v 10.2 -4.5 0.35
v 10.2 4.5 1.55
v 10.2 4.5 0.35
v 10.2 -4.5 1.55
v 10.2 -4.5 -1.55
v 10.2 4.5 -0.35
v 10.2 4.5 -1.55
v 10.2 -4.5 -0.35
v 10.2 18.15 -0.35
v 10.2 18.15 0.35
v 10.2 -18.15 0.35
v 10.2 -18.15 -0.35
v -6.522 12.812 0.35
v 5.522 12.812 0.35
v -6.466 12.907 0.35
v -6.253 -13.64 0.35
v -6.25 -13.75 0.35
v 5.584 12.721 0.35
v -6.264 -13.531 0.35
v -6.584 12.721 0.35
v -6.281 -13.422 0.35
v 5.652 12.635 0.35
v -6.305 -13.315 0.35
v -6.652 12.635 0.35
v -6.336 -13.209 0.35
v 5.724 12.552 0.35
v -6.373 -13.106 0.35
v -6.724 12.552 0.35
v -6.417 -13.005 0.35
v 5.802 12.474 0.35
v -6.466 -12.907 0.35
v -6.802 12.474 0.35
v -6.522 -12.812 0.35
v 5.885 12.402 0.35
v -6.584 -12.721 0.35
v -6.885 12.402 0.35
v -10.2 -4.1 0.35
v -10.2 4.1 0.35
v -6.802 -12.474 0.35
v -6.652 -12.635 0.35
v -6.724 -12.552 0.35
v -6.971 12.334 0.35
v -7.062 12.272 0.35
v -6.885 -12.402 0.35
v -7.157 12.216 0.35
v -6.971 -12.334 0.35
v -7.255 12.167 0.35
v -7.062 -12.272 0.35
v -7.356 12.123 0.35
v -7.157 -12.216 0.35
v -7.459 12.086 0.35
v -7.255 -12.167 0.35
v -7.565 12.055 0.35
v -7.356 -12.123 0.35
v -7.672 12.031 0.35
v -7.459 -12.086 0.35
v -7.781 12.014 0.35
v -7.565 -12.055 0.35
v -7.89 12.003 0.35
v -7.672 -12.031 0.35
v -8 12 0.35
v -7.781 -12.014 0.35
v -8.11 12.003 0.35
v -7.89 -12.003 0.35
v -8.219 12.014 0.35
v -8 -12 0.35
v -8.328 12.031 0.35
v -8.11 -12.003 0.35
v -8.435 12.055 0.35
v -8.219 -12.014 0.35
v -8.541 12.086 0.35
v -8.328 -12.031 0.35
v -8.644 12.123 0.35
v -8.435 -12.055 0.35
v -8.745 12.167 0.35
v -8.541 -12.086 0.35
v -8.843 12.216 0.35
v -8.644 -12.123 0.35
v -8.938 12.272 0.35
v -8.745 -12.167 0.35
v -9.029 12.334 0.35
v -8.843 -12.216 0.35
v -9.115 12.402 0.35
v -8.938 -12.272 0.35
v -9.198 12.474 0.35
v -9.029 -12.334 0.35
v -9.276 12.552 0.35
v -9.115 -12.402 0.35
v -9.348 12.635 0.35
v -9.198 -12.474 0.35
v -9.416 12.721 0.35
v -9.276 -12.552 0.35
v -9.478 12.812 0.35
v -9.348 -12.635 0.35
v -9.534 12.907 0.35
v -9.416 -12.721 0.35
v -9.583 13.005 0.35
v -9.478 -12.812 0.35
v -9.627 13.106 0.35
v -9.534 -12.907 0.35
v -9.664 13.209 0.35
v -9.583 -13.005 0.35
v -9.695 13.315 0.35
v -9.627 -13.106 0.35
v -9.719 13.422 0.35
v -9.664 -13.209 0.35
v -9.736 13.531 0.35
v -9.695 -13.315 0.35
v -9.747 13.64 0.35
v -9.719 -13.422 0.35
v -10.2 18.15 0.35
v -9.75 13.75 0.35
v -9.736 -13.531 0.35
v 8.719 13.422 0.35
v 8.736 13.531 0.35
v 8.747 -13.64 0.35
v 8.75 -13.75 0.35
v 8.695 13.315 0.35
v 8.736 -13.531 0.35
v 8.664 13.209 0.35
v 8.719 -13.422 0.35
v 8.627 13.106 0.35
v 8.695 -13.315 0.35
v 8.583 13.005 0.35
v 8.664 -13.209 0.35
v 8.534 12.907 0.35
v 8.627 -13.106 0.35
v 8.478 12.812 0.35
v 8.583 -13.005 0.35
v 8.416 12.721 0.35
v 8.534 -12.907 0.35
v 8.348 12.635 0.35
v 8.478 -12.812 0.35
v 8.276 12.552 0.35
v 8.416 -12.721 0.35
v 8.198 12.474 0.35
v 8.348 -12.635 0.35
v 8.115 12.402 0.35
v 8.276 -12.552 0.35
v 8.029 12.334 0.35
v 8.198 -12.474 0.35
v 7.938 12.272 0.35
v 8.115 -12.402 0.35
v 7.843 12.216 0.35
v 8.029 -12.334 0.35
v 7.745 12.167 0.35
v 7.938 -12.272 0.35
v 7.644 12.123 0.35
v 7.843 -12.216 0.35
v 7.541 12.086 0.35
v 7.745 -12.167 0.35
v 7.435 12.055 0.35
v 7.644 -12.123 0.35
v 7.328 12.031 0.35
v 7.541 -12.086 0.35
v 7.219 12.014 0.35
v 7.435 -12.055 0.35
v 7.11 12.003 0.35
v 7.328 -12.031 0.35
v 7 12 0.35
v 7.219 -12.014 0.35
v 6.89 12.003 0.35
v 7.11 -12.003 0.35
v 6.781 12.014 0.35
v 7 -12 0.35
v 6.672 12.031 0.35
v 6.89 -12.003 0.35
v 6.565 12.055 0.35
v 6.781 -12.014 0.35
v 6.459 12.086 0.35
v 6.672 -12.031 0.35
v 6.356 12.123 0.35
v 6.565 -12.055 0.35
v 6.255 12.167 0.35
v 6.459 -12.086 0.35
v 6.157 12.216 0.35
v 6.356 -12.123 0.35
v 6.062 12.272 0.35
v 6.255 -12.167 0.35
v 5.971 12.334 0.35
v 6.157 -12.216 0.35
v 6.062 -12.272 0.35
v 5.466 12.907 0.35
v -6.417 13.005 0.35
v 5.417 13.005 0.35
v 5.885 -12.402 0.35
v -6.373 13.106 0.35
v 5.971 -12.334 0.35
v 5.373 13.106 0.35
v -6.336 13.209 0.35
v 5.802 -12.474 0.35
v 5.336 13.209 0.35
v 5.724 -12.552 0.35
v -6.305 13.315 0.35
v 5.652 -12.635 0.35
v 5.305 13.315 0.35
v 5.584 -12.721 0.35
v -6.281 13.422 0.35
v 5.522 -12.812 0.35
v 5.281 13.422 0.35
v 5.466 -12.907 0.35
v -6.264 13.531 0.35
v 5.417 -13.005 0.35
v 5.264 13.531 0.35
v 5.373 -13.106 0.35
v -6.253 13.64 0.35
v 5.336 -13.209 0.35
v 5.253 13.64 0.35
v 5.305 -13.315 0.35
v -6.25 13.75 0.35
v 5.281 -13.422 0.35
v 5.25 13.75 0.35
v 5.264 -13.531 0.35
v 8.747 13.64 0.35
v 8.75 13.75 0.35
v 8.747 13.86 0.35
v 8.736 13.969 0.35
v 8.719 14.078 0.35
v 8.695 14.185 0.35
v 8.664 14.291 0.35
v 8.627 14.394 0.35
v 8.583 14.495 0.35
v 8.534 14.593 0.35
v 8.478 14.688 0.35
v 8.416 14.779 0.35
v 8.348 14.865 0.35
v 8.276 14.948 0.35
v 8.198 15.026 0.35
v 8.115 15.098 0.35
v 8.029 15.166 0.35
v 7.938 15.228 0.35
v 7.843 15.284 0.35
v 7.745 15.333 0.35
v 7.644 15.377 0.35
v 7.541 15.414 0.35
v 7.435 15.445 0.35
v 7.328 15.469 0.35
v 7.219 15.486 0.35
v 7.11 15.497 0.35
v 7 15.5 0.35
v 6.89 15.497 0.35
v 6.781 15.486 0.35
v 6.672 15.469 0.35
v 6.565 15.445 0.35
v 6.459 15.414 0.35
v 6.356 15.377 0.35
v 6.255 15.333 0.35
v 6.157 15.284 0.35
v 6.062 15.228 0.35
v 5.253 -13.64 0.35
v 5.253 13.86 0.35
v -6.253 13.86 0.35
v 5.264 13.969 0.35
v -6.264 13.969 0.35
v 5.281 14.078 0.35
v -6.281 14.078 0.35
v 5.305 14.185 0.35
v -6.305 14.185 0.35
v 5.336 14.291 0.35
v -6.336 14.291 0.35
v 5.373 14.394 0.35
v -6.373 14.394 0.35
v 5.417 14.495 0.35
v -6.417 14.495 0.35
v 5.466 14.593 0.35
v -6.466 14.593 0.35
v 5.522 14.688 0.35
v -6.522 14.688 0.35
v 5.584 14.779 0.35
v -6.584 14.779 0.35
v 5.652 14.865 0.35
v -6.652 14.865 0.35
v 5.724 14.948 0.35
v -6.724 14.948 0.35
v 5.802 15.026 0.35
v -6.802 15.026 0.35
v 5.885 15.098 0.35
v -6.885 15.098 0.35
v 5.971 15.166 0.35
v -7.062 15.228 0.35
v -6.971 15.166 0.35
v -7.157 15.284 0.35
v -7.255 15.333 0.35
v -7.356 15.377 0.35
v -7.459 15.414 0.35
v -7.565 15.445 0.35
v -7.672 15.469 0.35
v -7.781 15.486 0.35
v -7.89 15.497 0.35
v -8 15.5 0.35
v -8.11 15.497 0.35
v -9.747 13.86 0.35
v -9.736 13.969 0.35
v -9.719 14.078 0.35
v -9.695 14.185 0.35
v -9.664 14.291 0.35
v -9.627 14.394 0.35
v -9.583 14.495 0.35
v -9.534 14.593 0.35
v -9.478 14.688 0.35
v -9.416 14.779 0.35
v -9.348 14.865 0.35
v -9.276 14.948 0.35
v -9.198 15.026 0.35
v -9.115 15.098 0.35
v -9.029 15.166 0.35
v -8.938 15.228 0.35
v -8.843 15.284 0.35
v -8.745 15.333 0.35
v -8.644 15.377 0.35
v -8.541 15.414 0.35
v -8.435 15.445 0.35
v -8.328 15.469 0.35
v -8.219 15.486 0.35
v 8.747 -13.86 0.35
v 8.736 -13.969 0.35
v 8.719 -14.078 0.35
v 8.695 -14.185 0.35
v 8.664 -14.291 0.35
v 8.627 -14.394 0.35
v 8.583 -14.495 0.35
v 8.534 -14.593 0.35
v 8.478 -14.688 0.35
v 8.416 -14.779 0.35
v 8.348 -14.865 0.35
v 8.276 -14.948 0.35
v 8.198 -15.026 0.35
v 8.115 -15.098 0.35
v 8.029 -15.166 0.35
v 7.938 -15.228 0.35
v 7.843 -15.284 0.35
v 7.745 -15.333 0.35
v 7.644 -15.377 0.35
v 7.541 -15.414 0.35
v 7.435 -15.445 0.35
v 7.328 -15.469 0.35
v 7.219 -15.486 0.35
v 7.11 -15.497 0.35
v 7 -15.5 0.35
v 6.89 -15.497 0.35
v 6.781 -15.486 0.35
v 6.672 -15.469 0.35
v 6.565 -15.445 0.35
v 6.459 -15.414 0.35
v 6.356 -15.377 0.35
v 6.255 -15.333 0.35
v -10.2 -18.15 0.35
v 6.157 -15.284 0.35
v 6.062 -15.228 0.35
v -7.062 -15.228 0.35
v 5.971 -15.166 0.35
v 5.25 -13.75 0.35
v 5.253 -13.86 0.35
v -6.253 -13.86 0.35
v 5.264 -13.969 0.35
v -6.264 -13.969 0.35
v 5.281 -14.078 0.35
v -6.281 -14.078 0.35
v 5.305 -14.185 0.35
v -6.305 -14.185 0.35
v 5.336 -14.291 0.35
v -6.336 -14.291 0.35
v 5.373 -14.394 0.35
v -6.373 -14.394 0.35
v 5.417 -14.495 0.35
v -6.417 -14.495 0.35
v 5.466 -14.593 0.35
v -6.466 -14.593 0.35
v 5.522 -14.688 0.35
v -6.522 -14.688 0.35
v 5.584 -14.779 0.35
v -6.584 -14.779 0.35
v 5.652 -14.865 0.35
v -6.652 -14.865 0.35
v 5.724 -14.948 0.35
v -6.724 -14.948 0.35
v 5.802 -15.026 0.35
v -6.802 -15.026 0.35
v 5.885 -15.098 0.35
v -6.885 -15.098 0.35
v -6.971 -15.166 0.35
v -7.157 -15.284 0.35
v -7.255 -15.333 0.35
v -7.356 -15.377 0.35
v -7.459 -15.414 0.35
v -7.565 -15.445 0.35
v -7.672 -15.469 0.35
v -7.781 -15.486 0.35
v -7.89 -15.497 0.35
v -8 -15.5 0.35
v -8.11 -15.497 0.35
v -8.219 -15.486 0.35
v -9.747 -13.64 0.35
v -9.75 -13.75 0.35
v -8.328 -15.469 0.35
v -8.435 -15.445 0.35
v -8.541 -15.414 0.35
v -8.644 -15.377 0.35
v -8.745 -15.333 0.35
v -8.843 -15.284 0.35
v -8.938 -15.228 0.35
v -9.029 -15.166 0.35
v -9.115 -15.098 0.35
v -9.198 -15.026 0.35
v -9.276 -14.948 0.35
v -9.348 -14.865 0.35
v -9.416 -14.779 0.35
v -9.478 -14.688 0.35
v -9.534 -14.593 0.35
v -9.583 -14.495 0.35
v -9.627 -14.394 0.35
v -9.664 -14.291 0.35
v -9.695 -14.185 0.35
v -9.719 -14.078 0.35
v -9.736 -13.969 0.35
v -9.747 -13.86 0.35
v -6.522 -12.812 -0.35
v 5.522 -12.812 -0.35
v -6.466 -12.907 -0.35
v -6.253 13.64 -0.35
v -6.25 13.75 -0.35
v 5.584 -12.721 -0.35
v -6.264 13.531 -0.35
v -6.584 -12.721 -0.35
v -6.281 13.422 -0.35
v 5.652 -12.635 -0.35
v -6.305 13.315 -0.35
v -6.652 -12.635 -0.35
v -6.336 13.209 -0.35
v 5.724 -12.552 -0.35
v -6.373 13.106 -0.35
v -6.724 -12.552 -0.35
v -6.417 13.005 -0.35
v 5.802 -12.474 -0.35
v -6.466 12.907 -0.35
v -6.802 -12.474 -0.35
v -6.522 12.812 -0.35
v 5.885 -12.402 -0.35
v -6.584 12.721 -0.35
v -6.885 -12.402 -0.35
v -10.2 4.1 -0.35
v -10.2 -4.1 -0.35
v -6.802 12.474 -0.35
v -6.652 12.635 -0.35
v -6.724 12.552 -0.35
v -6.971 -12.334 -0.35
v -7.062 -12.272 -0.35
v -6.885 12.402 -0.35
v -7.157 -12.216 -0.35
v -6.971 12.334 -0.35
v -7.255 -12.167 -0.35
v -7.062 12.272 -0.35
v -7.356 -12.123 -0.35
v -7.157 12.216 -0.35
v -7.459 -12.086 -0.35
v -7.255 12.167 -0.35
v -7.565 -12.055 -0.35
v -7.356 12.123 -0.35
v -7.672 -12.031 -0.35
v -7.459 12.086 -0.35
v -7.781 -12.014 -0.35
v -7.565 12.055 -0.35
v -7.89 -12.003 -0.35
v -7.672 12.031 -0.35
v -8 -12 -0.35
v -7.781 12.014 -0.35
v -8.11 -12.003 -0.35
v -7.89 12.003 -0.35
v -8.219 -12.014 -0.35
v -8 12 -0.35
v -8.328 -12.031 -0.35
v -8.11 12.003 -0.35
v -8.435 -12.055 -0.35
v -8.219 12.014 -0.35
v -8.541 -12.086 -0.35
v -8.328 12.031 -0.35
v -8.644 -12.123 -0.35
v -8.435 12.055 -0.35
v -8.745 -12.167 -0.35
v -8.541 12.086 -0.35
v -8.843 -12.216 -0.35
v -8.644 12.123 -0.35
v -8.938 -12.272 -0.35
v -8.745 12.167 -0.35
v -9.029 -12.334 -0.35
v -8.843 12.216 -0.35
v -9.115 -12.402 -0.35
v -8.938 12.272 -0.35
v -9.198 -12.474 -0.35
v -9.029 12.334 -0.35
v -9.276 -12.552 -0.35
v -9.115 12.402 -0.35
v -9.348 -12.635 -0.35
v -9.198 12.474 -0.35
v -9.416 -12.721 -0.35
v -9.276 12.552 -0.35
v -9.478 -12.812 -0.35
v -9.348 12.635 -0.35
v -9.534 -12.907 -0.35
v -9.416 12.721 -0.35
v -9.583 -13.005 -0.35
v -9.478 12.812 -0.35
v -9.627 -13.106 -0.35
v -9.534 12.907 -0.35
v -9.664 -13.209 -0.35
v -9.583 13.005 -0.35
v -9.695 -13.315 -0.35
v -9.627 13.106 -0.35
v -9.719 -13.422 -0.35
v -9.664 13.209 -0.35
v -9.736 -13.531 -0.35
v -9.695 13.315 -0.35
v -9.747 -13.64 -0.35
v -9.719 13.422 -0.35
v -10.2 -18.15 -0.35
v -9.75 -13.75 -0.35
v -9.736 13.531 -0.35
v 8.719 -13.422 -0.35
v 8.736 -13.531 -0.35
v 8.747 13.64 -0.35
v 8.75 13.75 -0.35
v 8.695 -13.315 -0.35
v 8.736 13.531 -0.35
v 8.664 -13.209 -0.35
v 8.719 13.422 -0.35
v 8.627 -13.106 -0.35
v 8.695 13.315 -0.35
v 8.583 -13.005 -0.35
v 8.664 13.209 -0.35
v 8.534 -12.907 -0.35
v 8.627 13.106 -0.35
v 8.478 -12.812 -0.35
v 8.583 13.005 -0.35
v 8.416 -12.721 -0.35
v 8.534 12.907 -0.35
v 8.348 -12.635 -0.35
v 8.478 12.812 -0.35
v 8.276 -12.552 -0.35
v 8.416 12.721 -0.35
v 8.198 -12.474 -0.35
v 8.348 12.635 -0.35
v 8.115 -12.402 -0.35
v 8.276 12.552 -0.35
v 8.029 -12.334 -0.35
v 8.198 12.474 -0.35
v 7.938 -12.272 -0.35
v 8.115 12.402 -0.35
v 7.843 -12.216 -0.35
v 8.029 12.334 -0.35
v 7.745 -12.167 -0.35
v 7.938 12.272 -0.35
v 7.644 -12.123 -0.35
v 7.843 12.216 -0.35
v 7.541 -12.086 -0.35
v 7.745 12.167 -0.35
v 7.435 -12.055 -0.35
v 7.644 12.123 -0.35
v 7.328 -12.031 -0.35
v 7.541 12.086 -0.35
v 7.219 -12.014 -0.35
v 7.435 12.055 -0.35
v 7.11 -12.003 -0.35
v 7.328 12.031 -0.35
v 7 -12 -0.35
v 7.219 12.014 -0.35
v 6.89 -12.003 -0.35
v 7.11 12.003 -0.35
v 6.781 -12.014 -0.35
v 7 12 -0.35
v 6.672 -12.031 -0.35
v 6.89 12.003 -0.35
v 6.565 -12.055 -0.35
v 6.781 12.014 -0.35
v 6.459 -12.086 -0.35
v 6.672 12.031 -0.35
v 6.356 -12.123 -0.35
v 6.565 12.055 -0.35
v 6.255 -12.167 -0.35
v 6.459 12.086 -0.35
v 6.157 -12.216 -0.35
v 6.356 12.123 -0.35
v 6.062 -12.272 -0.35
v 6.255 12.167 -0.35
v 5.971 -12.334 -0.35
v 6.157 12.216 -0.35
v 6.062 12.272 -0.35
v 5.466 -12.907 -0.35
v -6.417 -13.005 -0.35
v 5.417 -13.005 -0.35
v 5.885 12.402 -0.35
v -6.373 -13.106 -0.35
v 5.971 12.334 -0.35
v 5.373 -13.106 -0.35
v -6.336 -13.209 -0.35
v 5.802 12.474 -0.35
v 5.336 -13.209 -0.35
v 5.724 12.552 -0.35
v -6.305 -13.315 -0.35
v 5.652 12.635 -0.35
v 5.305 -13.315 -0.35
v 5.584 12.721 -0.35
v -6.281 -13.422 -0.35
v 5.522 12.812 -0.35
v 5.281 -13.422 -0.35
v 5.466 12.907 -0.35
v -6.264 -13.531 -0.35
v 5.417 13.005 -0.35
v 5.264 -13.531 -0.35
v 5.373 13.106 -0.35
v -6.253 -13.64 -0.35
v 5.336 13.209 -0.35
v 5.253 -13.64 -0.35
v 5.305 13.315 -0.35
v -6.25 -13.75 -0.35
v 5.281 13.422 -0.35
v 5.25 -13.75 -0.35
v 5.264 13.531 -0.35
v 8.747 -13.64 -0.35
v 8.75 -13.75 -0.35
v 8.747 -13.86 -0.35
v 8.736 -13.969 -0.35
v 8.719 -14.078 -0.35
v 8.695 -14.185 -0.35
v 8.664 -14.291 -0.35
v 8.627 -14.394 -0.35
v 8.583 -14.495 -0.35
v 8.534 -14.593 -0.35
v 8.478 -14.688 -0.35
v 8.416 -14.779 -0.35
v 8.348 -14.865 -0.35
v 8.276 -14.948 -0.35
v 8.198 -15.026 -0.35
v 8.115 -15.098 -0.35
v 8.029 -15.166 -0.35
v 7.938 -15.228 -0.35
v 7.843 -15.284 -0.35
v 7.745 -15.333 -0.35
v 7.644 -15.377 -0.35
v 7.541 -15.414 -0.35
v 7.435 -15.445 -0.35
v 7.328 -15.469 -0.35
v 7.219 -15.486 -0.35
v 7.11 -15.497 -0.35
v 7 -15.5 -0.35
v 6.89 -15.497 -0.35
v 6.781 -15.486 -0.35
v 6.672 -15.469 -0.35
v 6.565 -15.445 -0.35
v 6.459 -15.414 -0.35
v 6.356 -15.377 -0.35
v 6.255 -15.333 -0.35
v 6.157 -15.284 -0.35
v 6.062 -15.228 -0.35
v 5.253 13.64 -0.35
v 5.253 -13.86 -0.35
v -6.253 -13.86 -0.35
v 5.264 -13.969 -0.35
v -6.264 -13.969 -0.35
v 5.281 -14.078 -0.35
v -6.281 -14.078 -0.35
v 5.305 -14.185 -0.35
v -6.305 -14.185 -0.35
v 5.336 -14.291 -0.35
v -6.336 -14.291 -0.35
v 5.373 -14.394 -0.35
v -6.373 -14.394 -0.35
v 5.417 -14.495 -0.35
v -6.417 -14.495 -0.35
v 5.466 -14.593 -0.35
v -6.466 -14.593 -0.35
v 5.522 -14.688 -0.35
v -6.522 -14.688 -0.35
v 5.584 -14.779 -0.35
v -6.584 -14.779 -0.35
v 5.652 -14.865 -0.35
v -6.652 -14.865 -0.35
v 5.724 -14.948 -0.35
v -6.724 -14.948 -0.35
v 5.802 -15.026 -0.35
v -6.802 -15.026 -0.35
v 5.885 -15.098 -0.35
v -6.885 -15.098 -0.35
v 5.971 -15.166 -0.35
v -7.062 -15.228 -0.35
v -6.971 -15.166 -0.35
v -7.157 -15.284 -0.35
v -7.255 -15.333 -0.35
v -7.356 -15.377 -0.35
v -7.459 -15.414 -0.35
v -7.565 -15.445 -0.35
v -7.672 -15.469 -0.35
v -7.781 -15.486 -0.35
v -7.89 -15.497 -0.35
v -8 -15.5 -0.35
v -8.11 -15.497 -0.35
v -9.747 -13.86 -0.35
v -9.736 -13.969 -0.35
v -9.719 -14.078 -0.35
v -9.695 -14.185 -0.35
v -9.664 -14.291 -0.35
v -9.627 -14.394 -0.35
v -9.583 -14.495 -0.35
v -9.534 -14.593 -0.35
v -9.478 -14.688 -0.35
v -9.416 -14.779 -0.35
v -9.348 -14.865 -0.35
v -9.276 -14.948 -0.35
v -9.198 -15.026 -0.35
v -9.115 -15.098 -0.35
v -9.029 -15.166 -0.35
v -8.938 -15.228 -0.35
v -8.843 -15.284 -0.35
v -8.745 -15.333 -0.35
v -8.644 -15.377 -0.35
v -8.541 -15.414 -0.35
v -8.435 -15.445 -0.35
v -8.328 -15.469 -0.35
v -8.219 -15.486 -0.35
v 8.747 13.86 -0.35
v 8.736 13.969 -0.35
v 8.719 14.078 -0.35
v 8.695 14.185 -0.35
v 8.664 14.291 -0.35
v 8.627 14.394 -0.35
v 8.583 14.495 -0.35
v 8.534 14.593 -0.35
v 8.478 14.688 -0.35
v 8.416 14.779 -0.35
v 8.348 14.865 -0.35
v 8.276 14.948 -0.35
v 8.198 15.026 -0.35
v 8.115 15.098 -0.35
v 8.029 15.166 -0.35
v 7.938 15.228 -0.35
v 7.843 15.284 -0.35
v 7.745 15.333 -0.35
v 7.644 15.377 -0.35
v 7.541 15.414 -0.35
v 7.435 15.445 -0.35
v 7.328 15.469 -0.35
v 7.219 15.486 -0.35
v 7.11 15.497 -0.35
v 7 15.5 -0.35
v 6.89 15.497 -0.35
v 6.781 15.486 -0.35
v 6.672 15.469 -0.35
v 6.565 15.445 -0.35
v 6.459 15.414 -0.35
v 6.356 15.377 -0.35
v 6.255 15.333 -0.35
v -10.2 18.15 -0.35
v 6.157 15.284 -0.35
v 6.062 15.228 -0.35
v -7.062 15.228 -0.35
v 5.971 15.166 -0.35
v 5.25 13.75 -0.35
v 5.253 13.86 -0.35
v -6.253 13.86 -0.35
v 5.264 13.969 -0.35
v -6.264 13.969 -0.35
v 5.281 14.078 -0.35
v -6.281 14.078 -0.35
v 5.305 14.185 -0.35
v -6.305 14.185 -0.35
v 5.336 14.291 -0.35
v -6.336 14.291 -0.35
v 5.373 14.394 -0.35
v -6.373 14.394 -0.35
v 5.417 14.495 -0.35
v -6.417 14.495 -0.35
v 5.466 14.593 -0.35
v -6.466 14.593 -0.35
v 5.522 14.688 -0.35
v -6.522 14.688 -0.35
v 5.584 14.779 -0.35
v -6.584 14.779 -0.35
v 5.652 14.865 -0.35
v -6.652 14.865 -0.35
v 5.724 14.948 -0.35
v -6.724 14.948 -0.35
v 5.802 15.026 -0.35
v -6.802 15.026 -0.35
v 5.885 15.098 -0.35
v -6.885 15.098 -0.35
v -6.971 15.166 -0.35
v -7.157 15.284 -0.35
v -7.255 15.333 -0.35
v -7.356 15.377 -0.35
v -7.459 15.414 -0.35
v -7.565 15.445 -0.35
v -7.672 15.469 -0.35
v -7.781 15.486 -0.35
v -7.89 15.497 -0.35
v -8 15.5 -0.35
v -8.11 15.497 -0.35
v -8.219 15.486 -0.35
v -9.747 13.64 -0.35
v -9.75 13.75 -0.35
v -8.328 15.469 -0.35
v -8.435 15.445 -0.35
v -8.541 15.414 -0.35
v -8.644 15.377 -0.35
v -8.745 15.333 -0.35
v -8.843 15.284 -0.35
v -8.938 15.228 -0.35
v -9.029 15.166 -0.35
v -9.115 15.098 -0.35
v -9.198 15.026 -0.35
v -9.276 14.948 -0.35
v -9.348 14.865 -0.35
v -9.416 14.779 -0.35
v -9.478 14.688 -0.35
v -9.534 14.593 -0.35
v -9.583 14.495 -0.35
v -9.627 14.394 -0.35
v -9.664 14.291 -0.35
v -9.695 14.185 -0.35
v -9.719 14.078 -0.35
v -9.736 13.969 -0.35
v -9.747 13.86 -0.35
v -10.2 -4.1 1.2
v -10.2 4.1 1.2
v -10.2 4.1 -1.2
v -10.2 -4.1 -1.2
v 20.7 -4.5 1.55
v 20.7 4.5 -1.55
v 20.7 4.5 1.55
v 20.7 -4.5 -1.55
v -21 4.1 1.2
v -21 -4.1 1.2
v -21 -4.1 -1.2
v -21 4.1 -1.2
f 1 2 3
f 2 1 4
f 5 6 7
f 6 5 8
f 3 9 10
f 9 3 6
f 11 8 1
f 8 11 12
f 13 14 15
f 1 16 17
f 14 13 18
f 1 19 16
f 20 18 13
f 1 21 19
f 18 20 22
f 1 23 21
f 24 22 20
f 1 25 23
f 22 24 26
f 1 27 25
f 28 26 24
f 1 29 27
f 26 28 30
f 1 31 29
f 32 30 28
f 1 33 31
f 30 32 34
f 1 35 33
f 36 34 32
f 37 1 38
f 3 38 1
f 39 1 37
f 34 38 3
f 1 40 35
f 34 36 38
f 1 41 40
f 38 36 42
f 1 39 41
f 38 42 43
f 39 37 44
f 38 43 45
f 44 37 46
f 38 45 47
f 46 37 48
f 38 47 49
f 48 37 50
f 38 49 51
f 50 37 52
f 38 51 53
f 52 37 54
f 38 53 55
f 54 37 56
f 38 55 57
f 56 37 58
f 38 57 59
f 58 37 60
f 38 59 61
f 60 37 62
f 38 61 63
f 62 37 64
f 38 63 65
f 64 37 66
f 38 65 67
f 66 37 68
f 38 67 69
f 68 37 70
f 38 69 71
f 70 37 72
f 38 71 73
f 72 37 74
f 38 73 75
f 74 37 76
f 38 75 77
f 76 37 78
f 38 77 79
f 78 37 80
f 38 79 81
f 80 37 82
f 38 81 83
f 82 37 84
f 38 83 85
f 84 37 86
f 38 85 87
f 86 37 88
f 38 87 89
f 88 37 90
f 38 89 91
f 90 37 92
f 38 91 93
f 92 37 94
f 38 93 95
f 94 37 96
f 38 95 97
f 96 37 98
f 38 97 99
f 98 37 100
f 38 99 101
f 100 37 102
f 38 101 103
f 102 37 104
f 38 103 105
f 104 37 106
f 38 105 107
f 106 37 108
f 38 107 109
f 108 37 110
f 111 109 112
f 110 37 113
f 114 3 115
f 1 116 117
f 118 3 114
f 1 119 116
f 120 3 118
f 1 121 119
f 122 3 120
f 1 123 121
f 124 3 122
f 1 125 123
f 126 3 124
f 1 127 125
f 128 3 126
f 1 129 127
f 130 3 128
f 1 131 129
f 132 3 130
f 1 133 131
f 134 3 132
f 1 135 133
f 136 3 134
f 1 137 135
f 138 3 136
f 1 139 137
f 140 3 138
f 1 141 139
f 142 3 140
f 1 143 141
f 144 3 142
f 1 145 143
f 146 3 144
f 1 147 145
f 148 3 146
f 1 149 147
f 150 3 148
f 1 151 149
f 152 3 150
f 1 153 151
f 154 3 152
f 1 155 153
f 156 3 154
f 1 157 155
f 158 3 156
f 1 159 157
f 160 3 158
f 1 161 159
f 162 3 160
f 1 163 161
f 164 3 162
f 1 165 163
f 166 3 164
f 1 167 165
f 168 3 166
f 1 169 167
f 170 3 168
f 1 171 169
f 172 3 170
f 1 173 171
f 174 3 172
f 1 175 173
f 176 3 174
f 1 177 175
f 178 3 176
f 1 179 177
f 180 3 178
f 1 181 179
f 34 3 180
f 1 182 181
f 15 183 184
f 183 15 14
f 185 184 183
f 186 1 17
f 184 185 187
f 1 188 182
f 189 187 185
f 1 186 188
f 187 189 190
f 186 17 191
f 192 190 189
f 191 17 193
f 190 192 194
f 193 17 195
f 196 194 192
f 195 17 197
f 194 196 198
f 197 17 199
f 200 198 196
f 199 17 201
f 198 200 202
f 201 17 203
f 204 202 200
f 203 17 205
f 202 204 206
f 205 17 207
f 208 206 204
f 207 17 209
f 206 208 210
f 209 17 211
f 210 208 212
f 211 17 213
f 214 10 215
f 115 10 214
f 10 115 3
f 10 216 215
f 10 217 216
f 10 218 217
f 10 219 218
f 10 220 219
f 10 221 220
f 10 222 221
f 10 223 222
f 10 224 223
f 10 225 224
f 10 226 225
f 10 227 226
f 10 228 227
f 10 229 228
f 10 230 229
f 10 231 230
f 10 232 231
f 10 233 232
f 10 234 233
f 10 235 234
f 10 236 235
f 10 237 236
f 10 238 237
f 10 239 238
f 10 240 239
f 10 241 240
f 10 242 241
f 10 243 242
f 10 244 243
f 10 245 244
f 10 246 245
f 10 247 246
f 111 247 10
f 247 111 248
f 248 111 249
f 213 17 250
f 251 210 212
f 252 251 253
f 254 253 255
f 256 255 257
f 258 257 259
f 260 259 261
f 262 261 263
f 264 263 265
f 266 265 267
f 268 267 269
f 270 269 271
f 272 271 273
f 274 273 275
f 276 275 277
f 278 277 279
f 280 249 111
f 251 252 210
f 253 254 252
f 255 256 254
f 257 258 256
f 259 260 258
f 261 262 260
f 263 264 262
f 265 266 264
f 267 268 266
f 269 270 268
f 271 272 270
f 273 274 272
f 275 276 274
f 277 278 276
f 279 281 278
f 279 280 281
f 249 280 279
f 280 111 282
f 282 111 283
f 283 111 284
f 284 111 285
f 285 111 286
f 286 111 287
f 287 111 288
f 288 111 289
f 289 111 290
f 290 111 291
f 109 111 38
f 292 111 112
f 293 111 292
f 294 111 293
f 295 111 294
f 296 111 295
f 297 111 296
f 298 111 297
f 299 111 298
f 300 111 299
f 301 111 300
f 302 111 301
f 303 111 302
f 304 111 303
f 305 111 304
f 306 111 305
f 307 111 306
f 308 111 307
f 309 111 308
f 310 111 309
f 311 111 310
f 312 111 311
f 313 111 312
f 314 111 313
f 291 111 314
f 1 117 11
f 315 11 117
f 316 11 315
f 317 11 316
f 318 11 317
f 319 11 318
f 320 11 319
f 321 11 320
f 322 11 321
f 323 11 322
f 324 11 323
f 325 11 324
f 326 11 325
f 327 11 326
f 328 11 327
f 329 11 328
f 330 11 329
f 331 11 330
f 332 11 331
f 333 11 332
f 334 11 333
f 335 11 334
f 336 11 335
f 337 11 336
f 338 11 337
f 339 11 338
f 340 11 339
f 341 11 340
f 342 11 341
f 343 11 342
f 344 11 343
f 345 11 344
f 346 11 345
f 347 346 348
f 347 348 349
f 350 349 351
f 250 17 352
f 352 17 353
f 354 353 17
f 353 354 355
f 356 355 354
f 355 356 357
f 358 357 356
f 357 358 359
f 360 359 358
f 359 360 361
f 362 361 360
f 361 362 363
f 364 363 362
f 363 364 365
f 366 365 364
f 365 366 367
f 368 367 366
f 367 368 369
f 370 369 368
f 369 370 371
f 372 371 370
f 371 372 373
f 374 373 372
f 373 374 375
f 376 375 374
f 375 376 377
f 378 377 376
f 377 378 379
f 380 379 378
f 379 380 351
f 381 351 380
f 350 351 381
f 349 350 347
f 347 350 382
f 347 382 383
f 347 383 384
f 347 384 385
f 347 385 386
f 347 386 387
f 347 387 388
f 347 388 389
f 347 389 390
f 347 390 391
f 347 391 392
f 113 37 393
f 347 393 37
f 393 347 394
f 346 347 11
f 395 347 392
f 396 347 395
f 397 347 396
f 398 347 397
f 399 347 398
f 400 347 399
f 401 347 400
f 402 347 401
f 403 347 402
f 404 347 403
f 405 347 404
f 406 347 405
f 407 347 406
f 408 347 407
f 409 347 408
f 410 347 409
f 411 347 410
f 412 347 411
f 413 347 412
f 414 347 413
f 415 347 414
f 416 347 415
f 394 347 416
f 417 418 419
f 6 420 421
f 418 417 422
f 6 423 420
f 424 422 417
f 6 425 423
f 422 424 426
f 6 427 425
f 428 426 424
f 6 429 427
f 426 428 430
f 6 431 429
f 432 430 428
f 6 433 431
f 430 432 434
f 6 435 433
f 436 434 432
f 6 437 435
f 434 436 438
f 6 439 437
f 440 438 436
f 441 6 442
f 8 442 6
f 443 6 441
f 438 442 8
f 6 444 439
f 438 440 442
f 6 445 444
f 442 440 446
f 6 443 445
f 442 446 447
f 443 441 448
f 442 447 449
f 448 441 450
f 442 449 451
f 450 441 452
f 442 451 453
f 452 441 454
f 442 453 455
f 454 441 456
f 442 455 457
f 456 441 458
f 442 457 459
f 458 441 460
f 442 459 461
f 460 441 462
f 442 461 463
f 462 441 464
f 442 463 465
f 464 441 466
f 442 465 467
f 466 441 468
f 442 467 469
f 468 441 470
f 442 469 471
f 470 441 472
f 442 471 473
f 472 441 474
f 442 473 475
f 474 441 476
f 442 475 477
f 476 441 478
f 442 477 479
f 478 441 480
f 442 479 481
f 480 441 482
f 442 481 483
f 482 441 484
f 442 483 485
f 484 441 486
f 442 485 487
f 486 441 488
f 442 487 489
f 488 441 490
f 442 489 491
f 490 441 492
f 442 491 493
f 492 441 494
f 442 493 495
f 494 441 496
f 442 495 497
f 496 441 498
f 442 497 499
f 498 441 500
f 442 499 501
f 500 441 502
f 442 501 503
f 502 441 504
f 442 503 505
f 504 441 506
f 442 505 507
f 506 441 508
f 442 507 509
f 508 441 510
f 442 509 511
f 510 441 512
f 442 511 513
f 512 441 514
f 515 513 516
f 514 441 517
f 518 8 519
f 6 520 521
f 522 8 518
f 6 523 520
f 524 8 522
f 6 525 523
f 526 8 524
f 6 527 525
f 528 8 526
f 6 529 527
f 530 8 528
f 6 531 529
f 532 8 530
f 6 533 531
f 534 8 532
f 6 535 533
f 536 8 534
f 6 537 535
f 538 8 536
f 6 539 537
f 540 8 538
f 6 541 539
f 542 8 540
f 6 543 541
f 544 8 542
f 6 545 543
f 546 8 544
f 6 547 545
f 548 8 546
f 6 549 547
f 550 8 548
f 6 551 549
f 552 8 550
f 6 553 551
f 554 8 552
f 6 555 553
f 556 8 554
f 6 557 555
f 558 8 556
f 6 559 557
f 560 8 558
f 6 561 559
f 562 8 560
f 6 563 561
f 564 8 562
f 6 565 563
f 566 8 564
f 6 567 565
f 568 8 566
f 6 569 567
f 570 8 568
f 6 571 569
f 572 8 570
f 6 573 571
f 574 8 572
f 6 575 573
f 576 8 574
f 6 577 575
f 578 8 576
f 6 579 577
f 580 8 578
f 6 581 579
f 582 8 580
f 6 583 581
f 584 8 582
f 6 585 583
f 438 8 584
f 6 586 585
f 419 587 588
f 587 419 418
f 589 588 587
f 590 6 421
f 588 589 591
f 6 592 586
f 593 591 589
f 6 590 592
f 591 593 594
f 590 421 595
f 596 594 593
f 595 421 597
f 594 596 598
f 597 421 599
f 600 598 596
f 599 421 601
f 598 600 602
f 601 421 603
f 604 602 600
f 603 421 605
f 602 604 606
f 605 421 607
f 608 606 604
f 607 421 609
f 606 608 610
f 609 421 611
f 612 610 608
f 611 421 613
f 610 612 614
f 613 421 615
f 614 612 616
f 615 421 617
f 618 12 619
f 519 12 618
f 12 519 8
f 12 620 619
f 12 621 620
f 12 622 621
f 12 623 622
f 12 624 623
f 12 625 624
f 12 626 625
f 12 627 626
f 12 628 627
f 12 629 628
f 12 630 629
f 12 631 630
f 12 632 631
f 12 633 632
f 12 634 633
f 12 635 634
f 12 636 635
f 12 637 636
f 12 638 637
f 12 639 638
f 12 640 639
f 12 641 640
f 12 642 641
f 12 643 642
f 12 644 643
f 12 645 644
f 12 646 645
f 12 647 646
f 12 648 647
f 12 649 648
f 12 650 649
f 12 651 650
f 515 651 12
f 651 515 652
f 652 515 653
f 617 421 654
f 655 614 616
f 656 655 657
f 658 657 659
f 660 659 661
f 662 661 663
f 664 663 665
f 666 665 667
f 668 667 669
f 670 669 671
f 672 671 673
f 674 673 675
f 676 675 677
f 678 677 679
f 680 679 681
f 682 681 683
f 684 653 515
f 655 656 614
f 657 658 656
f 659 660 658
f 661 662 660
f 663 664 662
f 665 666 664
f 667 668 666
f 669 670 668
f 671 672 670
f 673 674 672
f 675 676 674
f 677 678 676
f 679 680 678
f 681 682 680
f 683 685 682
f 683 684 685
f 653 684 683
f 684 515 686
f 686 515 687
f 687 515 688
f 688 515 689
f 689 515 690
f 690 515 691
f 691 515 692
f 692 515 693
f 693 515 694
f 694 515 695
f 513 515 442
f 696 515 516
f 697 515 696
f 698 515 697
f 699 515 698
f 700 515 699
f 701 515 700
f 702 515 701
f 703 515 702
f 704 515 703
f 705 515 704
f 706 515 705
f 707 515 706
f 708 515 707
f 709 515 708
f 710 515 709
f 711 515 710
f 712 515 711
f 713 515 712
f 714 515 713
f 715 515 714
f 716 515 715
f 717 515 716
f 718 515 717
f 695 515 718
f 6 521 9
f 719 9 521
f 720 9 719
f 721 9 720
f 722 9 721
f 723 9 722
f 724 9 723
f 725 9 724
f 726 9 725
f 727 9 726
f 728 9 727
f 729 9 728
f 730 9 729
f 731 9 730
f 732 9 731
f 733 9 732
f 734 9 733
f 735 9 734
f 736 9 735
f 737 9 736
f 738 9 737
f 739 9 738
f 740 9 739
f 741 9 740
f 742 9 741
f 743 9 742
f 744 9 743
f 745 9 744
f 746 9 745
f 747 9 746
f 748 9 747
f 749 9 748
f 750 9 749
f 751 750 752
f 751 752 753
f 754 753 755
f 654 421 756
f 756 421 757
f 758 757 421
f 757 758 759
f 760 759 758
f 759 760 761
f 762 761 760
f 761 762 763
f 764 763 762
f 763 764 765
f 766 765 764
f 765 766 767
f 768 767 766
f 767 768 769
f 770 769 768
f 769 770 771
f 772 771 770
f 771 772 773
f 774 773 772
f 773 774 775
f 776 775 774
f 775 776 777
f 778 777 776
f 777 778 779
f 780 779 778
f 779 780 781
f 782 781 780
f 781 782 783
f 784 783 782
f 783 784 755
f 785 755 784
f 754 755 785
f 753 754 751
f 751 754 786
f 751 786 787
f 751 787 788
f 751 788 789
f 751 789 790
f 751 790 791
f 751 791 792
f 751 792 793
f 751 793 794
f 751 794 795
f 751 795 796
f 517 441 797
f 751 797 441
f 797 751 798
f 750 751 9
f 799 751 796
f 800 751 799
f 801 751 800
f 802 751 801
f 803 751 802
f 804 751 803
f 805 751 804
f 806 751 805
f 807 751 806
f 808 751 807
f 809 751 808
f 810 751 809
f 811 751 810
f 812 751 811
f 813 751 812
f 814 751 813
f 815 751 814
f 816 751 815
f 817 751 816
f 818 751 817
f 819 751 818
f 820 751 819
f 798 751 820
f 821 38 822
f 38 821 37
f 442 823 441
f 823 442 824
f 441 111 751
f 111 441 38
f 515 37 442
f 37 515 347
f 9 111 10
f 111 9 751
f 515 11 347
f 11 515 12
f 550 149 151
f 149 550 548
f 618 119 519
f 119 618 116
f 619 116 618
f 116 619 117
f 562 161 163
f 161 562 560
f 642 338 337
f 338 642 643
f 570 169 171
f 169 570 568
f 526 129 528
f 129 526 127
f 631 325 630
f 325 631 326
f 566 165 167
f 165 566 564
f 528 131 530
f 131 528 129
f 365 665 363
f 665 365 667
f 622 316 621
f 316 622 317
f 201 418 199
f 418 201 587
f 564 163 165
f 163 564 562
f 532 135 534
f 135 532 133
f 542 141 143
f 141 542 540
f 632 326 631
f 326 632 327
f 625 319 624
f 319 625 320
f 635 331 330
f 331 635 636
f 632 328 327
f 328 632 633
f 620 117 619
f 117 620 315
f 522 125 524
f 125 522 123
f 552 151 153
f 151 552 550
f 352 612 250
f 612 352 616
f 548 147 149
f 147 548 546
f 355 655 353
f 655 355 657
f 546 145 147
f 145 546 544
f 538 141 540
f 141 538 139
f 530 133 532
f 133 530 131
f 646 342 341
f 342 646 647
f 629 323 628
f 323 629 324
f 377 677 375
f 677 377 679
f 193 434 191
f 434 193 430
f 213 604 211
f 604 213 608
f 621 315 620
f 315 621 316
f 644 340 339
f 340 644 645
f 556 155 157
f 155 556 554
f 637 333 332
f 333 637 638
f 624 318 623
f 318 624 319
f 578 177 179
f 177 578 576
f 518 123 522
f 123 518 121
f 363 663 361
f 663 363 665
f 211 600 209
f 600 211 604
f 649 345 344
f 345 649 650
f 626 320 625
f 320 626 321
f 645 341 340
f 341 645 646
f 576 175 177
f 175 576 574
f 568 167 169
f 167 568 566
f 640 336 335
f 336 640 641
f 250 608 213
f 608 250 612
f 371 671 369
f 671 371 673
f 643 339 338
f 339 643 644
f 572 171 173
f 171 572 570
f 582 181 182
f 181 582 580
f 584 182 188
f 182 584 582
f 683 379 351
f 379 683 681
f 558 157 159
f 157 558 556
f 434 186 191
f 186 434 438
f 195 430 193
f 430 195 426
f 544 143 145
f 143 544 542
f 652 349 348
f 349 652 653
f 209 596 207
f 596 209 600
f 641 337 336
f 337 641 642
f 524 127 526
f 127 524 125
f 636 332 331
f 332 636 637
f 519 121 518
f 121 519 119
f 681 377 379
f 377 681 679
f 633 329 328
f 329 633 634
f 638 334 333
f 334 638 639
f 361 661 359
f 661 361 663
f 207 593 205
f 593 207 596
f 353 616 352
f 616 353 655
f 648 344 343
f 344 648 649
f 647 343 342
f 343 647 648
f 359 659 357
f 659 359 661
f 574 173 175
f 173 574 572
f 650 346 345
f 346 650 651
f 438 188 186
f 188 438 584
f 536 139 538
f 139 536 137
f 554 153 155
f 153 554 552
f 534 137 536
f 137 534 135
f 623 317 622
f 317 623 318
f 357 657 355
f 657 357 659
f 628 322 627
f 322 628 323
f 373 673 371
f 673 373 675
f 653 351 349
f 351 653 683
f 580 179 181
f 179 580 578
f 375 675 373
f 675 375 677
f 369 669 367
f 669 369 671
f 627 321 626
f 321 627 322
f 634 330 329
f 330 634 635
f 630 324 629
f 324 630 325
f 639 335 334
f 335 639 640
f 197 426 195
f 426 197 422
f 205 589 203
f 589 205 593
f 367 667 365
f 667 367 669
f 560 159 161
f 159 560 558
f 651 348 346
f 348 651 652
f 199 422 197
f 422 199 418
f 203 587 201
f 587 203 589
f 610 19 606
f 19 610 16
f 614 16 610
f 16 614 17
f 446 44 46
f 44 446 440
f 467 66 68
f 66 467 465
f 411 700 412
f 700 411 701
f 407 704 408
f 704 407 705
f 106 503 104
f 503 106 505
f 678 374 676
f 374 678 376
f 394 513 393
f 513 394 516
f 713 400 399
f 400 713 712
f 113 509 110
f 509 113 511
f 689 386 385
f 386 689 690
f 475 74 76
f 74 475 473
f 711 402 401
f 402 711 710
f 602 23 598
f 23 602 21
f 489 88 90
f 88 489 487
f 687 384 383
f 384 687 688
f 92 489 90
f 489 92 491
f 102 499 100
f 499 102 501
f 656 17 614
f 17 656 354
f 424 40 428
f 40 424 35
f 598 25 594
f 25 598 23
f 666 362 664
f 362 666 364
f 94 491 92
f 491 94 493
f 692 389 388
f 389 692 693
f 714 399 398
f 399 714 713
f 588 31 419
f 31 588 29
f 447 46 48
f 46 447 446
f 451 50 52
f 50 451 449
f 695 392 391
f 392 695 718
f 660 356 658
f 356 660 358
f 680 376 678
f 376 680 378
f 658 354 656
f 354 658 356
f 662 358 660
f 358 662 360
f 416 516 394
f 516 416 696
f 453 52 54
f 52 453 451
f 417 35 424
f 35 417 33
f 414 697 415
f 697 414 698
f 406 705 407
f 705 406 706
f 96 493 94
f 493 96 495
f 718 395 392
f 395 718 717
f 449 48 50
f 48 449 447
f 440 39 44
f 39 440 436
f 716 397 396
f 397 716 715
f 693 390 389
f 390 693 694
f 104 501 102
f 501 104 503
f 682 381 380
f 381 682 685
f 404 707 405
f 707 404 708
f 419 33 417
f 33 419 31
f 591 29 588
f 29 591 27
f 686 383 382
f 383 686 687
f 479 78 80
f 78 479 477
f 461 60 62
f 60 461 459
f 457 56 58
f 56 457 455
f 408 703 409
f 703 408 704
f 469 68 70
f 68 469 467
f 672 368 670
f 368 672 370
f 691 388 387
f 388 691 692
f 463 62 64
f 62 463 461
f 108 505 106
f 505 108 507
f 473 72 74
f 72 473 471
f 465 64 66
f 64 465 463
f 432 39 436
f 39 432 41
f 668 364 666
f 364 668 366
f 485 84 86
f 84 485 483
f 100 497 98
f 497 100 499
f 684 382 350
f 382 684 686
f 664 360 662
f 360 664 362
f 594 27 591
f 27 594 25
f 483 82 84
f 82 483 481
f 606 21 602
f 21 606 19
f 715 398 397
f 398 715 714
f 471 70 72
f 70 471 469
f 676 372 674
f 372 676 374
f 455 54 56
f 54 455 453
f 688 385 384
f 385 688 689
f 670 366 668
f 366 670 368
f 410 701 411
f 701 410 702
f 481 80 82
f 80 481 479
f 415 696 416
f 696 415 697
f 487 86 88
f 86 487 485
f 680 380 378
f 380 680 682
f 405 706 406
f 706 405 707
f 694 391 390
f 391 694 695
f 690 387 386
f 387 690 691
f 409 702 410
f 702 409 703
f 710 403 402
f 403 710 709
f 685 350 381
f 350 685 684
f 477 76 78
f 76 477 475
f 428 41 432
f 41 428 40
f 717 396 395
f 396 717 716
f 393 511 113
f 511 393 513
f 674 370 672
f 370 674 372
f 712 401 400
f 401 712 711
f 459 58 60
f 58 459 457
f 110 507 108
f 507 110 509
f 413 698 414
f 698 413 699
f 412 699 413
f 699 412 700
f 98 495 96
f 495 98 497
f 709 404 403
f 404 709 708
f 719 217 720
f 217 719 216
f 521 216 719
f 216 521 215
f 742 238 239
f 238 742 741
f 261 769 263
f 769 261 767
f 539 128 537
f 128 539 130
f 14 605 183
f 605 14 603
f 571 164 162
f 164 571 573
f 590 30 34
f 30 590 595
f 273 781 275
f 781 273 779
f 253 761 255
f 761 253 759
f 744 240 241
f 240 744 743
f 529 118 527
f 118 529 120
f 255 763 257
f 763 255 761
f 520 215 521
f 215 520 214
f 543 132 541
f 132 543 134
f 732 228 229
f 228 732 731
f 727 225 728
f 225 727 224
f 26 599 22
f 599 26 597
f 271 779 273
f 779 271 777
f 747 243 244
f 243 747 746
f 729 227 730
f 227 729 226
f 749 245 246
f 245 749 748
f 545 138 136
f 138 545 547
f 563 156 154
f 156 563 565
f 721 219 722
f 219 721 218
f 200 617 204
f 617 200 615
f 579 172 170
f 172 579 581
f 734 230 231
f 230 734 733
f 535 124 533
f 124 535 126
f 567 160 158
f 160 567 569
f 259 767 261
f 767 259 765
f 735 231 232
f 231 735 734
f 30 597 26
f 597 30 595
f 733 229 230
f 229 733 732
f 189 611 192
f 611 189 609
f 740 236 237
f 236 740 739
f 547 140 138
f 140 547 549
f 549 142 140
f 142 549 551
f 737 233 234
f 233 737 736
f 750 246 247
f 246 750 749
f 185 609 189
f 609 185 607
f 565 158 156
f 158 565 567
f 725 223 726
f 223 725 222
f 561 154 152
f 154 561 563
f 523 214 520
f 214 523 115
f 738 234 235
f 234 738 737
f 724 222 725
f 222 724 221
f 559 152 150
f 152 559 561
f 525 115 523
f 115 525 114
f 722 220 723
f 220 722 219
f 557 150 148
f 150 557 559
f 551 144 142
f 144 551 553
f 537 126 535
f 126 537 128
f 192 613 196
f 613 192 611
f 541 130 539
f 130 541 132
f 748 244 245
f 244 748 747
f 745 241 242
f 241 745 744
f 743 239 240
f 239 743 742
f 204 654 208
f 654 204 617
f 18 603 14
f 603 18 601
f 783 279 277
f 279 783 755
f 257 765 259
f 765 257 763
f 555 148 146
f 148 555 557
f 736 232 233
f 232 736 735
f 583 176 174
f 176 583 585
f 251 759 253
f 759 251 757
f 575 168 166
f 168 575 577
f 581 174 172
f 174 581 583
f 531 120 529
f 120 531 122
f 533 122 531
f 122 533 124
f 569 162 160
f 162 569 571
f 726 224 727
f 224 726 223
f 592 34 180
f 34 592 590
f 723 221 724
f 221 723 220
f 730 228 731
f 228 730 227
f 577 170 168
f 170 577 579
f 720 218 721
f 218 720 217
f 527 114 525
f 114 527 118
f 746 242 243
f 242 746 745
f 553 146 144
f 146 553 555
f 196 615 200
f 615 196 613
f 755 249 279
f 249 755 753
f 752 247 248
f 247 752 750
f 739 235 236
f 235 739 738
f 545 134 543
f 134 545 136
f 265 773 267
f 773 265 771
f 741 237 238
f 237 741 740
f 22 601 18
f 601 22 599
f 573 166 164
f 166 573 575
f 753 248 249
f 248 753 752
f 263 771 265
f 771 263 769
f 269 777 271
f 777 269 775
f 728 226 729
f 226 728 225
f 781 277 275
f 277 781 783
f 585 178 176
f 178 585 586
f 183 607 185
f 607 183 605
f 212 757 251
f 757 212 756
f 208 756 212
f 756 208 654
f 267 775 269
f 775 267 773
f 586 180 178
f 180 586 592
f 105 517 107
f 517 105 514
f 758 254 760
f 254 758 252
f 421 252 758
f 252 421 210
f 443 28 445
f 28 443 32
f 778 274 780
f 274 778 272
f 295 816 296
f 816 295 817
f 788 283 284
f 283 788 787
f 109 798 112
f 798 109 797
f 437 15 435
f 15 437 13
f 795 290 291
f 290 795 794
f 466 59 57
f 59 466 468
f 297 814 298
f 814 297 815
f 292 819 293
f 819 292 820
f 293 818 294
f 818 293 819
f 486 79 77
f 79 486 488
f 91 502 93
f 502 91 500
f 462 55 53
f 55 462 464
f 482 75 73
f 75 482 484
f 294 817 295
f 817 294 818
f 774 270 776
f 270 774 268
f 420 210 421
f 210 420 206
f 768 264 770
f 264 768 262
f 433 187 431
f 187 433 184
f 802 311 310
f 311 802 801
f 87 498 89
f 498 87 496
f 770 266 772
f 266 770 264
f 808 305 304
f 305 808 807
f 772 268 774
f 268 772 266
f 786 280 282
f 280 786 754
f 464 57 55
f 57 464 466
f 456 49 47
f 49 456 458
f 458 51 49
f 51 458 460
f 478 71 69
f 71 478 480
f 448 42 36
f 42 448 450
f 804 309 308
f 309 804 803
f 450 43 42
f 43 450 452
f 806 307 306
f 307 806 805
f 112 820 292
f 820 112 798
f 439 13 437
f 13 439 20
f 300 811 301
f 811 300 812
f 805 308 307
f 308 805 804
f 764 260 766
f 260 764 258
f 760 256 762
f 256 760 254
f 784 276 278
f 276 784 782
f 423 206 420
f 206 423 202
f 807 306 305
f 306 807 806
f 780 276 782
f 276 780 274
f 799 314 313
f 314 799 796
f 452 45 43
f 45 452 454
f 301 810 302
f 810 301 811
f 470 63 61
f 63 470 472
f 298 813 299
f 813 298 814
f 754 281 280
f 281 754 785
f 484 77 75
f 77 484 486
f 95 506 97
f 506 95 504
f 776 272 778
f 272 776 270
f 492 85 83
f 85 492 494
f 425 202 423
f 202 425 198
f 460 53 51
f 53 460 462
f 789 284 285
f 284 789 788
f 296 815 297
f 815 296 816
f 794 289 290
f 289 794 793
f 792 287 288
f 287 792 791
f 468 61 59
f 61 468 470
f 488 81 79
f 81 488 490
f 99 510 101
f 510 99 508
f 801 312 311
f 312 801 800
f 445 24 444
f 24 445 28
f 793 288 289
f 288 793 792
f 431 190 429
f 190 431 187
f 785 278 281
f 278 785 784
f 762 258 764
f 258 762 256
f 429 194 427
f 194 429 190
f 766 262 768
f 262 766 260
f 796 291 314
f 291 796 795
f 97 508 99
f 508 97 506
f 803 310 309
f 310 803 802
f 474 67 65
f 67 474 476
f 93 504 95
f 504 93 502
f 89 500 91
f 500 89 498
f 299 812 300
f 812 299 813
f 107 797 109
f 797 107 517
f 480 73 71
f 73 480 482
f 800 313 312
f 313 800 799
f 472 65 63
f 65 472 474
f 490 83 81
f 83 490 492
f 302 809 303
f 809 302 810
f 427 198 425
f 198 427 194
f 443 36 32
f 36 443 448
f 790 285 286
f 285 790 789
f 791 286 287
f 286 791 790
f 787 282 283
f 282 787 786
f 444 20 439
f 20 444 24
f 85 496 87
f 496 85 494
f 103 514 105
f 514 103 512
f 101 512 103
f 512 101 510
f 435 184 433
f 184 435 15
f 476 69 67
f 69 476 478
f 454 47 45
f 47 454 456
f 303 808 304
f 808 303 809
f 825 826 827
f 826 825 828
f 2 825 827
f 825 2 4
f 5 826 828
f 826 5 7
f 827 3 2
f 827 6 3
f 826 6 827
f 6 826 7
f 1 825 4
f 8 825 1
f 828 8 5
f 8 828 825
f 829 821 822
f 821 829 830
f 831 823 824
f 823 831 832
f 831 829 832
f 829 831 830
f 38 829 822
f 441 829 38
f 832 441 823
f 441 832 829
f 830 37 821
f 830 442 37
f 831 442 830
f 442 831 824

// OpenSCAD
module usb_debug_pcb() {
    pcb=[20.4,36.3,0.7];
    usbf=[10.5,9.0,3.1];    
    usbm=[10.8,8.2,2.4];
    union() {
      // PCB
      difference() {
        cube(pcb, center=true);
        translate([7,-(25+2.5)/2,-4])
          cylinder(h=8,d=3.5);
        translate([-8,-(25+2.5)/2,-4])
          cylinder(h=8,d=3.5);
        translate([7,(25+2.5)/2,-4])
          cylinder(h=8,d=3.5);
        translate([-8,(25+2.5)/2,-4])
          cylinder(h=8,d=3.5);
      }
      //25 31.5
      // USB
      translate([+(pcb[0]+usbf[0])/2,0,0])
        cube(usbf, center=true);    
      translate([-(pcb[0]+usbm[0])/2,0,0])
        cube(usbm, center=true);    
    }
}

$fn=100;
color("#AAAA30")
rotate([0,0,0])
  usb_debug_pcb();    
